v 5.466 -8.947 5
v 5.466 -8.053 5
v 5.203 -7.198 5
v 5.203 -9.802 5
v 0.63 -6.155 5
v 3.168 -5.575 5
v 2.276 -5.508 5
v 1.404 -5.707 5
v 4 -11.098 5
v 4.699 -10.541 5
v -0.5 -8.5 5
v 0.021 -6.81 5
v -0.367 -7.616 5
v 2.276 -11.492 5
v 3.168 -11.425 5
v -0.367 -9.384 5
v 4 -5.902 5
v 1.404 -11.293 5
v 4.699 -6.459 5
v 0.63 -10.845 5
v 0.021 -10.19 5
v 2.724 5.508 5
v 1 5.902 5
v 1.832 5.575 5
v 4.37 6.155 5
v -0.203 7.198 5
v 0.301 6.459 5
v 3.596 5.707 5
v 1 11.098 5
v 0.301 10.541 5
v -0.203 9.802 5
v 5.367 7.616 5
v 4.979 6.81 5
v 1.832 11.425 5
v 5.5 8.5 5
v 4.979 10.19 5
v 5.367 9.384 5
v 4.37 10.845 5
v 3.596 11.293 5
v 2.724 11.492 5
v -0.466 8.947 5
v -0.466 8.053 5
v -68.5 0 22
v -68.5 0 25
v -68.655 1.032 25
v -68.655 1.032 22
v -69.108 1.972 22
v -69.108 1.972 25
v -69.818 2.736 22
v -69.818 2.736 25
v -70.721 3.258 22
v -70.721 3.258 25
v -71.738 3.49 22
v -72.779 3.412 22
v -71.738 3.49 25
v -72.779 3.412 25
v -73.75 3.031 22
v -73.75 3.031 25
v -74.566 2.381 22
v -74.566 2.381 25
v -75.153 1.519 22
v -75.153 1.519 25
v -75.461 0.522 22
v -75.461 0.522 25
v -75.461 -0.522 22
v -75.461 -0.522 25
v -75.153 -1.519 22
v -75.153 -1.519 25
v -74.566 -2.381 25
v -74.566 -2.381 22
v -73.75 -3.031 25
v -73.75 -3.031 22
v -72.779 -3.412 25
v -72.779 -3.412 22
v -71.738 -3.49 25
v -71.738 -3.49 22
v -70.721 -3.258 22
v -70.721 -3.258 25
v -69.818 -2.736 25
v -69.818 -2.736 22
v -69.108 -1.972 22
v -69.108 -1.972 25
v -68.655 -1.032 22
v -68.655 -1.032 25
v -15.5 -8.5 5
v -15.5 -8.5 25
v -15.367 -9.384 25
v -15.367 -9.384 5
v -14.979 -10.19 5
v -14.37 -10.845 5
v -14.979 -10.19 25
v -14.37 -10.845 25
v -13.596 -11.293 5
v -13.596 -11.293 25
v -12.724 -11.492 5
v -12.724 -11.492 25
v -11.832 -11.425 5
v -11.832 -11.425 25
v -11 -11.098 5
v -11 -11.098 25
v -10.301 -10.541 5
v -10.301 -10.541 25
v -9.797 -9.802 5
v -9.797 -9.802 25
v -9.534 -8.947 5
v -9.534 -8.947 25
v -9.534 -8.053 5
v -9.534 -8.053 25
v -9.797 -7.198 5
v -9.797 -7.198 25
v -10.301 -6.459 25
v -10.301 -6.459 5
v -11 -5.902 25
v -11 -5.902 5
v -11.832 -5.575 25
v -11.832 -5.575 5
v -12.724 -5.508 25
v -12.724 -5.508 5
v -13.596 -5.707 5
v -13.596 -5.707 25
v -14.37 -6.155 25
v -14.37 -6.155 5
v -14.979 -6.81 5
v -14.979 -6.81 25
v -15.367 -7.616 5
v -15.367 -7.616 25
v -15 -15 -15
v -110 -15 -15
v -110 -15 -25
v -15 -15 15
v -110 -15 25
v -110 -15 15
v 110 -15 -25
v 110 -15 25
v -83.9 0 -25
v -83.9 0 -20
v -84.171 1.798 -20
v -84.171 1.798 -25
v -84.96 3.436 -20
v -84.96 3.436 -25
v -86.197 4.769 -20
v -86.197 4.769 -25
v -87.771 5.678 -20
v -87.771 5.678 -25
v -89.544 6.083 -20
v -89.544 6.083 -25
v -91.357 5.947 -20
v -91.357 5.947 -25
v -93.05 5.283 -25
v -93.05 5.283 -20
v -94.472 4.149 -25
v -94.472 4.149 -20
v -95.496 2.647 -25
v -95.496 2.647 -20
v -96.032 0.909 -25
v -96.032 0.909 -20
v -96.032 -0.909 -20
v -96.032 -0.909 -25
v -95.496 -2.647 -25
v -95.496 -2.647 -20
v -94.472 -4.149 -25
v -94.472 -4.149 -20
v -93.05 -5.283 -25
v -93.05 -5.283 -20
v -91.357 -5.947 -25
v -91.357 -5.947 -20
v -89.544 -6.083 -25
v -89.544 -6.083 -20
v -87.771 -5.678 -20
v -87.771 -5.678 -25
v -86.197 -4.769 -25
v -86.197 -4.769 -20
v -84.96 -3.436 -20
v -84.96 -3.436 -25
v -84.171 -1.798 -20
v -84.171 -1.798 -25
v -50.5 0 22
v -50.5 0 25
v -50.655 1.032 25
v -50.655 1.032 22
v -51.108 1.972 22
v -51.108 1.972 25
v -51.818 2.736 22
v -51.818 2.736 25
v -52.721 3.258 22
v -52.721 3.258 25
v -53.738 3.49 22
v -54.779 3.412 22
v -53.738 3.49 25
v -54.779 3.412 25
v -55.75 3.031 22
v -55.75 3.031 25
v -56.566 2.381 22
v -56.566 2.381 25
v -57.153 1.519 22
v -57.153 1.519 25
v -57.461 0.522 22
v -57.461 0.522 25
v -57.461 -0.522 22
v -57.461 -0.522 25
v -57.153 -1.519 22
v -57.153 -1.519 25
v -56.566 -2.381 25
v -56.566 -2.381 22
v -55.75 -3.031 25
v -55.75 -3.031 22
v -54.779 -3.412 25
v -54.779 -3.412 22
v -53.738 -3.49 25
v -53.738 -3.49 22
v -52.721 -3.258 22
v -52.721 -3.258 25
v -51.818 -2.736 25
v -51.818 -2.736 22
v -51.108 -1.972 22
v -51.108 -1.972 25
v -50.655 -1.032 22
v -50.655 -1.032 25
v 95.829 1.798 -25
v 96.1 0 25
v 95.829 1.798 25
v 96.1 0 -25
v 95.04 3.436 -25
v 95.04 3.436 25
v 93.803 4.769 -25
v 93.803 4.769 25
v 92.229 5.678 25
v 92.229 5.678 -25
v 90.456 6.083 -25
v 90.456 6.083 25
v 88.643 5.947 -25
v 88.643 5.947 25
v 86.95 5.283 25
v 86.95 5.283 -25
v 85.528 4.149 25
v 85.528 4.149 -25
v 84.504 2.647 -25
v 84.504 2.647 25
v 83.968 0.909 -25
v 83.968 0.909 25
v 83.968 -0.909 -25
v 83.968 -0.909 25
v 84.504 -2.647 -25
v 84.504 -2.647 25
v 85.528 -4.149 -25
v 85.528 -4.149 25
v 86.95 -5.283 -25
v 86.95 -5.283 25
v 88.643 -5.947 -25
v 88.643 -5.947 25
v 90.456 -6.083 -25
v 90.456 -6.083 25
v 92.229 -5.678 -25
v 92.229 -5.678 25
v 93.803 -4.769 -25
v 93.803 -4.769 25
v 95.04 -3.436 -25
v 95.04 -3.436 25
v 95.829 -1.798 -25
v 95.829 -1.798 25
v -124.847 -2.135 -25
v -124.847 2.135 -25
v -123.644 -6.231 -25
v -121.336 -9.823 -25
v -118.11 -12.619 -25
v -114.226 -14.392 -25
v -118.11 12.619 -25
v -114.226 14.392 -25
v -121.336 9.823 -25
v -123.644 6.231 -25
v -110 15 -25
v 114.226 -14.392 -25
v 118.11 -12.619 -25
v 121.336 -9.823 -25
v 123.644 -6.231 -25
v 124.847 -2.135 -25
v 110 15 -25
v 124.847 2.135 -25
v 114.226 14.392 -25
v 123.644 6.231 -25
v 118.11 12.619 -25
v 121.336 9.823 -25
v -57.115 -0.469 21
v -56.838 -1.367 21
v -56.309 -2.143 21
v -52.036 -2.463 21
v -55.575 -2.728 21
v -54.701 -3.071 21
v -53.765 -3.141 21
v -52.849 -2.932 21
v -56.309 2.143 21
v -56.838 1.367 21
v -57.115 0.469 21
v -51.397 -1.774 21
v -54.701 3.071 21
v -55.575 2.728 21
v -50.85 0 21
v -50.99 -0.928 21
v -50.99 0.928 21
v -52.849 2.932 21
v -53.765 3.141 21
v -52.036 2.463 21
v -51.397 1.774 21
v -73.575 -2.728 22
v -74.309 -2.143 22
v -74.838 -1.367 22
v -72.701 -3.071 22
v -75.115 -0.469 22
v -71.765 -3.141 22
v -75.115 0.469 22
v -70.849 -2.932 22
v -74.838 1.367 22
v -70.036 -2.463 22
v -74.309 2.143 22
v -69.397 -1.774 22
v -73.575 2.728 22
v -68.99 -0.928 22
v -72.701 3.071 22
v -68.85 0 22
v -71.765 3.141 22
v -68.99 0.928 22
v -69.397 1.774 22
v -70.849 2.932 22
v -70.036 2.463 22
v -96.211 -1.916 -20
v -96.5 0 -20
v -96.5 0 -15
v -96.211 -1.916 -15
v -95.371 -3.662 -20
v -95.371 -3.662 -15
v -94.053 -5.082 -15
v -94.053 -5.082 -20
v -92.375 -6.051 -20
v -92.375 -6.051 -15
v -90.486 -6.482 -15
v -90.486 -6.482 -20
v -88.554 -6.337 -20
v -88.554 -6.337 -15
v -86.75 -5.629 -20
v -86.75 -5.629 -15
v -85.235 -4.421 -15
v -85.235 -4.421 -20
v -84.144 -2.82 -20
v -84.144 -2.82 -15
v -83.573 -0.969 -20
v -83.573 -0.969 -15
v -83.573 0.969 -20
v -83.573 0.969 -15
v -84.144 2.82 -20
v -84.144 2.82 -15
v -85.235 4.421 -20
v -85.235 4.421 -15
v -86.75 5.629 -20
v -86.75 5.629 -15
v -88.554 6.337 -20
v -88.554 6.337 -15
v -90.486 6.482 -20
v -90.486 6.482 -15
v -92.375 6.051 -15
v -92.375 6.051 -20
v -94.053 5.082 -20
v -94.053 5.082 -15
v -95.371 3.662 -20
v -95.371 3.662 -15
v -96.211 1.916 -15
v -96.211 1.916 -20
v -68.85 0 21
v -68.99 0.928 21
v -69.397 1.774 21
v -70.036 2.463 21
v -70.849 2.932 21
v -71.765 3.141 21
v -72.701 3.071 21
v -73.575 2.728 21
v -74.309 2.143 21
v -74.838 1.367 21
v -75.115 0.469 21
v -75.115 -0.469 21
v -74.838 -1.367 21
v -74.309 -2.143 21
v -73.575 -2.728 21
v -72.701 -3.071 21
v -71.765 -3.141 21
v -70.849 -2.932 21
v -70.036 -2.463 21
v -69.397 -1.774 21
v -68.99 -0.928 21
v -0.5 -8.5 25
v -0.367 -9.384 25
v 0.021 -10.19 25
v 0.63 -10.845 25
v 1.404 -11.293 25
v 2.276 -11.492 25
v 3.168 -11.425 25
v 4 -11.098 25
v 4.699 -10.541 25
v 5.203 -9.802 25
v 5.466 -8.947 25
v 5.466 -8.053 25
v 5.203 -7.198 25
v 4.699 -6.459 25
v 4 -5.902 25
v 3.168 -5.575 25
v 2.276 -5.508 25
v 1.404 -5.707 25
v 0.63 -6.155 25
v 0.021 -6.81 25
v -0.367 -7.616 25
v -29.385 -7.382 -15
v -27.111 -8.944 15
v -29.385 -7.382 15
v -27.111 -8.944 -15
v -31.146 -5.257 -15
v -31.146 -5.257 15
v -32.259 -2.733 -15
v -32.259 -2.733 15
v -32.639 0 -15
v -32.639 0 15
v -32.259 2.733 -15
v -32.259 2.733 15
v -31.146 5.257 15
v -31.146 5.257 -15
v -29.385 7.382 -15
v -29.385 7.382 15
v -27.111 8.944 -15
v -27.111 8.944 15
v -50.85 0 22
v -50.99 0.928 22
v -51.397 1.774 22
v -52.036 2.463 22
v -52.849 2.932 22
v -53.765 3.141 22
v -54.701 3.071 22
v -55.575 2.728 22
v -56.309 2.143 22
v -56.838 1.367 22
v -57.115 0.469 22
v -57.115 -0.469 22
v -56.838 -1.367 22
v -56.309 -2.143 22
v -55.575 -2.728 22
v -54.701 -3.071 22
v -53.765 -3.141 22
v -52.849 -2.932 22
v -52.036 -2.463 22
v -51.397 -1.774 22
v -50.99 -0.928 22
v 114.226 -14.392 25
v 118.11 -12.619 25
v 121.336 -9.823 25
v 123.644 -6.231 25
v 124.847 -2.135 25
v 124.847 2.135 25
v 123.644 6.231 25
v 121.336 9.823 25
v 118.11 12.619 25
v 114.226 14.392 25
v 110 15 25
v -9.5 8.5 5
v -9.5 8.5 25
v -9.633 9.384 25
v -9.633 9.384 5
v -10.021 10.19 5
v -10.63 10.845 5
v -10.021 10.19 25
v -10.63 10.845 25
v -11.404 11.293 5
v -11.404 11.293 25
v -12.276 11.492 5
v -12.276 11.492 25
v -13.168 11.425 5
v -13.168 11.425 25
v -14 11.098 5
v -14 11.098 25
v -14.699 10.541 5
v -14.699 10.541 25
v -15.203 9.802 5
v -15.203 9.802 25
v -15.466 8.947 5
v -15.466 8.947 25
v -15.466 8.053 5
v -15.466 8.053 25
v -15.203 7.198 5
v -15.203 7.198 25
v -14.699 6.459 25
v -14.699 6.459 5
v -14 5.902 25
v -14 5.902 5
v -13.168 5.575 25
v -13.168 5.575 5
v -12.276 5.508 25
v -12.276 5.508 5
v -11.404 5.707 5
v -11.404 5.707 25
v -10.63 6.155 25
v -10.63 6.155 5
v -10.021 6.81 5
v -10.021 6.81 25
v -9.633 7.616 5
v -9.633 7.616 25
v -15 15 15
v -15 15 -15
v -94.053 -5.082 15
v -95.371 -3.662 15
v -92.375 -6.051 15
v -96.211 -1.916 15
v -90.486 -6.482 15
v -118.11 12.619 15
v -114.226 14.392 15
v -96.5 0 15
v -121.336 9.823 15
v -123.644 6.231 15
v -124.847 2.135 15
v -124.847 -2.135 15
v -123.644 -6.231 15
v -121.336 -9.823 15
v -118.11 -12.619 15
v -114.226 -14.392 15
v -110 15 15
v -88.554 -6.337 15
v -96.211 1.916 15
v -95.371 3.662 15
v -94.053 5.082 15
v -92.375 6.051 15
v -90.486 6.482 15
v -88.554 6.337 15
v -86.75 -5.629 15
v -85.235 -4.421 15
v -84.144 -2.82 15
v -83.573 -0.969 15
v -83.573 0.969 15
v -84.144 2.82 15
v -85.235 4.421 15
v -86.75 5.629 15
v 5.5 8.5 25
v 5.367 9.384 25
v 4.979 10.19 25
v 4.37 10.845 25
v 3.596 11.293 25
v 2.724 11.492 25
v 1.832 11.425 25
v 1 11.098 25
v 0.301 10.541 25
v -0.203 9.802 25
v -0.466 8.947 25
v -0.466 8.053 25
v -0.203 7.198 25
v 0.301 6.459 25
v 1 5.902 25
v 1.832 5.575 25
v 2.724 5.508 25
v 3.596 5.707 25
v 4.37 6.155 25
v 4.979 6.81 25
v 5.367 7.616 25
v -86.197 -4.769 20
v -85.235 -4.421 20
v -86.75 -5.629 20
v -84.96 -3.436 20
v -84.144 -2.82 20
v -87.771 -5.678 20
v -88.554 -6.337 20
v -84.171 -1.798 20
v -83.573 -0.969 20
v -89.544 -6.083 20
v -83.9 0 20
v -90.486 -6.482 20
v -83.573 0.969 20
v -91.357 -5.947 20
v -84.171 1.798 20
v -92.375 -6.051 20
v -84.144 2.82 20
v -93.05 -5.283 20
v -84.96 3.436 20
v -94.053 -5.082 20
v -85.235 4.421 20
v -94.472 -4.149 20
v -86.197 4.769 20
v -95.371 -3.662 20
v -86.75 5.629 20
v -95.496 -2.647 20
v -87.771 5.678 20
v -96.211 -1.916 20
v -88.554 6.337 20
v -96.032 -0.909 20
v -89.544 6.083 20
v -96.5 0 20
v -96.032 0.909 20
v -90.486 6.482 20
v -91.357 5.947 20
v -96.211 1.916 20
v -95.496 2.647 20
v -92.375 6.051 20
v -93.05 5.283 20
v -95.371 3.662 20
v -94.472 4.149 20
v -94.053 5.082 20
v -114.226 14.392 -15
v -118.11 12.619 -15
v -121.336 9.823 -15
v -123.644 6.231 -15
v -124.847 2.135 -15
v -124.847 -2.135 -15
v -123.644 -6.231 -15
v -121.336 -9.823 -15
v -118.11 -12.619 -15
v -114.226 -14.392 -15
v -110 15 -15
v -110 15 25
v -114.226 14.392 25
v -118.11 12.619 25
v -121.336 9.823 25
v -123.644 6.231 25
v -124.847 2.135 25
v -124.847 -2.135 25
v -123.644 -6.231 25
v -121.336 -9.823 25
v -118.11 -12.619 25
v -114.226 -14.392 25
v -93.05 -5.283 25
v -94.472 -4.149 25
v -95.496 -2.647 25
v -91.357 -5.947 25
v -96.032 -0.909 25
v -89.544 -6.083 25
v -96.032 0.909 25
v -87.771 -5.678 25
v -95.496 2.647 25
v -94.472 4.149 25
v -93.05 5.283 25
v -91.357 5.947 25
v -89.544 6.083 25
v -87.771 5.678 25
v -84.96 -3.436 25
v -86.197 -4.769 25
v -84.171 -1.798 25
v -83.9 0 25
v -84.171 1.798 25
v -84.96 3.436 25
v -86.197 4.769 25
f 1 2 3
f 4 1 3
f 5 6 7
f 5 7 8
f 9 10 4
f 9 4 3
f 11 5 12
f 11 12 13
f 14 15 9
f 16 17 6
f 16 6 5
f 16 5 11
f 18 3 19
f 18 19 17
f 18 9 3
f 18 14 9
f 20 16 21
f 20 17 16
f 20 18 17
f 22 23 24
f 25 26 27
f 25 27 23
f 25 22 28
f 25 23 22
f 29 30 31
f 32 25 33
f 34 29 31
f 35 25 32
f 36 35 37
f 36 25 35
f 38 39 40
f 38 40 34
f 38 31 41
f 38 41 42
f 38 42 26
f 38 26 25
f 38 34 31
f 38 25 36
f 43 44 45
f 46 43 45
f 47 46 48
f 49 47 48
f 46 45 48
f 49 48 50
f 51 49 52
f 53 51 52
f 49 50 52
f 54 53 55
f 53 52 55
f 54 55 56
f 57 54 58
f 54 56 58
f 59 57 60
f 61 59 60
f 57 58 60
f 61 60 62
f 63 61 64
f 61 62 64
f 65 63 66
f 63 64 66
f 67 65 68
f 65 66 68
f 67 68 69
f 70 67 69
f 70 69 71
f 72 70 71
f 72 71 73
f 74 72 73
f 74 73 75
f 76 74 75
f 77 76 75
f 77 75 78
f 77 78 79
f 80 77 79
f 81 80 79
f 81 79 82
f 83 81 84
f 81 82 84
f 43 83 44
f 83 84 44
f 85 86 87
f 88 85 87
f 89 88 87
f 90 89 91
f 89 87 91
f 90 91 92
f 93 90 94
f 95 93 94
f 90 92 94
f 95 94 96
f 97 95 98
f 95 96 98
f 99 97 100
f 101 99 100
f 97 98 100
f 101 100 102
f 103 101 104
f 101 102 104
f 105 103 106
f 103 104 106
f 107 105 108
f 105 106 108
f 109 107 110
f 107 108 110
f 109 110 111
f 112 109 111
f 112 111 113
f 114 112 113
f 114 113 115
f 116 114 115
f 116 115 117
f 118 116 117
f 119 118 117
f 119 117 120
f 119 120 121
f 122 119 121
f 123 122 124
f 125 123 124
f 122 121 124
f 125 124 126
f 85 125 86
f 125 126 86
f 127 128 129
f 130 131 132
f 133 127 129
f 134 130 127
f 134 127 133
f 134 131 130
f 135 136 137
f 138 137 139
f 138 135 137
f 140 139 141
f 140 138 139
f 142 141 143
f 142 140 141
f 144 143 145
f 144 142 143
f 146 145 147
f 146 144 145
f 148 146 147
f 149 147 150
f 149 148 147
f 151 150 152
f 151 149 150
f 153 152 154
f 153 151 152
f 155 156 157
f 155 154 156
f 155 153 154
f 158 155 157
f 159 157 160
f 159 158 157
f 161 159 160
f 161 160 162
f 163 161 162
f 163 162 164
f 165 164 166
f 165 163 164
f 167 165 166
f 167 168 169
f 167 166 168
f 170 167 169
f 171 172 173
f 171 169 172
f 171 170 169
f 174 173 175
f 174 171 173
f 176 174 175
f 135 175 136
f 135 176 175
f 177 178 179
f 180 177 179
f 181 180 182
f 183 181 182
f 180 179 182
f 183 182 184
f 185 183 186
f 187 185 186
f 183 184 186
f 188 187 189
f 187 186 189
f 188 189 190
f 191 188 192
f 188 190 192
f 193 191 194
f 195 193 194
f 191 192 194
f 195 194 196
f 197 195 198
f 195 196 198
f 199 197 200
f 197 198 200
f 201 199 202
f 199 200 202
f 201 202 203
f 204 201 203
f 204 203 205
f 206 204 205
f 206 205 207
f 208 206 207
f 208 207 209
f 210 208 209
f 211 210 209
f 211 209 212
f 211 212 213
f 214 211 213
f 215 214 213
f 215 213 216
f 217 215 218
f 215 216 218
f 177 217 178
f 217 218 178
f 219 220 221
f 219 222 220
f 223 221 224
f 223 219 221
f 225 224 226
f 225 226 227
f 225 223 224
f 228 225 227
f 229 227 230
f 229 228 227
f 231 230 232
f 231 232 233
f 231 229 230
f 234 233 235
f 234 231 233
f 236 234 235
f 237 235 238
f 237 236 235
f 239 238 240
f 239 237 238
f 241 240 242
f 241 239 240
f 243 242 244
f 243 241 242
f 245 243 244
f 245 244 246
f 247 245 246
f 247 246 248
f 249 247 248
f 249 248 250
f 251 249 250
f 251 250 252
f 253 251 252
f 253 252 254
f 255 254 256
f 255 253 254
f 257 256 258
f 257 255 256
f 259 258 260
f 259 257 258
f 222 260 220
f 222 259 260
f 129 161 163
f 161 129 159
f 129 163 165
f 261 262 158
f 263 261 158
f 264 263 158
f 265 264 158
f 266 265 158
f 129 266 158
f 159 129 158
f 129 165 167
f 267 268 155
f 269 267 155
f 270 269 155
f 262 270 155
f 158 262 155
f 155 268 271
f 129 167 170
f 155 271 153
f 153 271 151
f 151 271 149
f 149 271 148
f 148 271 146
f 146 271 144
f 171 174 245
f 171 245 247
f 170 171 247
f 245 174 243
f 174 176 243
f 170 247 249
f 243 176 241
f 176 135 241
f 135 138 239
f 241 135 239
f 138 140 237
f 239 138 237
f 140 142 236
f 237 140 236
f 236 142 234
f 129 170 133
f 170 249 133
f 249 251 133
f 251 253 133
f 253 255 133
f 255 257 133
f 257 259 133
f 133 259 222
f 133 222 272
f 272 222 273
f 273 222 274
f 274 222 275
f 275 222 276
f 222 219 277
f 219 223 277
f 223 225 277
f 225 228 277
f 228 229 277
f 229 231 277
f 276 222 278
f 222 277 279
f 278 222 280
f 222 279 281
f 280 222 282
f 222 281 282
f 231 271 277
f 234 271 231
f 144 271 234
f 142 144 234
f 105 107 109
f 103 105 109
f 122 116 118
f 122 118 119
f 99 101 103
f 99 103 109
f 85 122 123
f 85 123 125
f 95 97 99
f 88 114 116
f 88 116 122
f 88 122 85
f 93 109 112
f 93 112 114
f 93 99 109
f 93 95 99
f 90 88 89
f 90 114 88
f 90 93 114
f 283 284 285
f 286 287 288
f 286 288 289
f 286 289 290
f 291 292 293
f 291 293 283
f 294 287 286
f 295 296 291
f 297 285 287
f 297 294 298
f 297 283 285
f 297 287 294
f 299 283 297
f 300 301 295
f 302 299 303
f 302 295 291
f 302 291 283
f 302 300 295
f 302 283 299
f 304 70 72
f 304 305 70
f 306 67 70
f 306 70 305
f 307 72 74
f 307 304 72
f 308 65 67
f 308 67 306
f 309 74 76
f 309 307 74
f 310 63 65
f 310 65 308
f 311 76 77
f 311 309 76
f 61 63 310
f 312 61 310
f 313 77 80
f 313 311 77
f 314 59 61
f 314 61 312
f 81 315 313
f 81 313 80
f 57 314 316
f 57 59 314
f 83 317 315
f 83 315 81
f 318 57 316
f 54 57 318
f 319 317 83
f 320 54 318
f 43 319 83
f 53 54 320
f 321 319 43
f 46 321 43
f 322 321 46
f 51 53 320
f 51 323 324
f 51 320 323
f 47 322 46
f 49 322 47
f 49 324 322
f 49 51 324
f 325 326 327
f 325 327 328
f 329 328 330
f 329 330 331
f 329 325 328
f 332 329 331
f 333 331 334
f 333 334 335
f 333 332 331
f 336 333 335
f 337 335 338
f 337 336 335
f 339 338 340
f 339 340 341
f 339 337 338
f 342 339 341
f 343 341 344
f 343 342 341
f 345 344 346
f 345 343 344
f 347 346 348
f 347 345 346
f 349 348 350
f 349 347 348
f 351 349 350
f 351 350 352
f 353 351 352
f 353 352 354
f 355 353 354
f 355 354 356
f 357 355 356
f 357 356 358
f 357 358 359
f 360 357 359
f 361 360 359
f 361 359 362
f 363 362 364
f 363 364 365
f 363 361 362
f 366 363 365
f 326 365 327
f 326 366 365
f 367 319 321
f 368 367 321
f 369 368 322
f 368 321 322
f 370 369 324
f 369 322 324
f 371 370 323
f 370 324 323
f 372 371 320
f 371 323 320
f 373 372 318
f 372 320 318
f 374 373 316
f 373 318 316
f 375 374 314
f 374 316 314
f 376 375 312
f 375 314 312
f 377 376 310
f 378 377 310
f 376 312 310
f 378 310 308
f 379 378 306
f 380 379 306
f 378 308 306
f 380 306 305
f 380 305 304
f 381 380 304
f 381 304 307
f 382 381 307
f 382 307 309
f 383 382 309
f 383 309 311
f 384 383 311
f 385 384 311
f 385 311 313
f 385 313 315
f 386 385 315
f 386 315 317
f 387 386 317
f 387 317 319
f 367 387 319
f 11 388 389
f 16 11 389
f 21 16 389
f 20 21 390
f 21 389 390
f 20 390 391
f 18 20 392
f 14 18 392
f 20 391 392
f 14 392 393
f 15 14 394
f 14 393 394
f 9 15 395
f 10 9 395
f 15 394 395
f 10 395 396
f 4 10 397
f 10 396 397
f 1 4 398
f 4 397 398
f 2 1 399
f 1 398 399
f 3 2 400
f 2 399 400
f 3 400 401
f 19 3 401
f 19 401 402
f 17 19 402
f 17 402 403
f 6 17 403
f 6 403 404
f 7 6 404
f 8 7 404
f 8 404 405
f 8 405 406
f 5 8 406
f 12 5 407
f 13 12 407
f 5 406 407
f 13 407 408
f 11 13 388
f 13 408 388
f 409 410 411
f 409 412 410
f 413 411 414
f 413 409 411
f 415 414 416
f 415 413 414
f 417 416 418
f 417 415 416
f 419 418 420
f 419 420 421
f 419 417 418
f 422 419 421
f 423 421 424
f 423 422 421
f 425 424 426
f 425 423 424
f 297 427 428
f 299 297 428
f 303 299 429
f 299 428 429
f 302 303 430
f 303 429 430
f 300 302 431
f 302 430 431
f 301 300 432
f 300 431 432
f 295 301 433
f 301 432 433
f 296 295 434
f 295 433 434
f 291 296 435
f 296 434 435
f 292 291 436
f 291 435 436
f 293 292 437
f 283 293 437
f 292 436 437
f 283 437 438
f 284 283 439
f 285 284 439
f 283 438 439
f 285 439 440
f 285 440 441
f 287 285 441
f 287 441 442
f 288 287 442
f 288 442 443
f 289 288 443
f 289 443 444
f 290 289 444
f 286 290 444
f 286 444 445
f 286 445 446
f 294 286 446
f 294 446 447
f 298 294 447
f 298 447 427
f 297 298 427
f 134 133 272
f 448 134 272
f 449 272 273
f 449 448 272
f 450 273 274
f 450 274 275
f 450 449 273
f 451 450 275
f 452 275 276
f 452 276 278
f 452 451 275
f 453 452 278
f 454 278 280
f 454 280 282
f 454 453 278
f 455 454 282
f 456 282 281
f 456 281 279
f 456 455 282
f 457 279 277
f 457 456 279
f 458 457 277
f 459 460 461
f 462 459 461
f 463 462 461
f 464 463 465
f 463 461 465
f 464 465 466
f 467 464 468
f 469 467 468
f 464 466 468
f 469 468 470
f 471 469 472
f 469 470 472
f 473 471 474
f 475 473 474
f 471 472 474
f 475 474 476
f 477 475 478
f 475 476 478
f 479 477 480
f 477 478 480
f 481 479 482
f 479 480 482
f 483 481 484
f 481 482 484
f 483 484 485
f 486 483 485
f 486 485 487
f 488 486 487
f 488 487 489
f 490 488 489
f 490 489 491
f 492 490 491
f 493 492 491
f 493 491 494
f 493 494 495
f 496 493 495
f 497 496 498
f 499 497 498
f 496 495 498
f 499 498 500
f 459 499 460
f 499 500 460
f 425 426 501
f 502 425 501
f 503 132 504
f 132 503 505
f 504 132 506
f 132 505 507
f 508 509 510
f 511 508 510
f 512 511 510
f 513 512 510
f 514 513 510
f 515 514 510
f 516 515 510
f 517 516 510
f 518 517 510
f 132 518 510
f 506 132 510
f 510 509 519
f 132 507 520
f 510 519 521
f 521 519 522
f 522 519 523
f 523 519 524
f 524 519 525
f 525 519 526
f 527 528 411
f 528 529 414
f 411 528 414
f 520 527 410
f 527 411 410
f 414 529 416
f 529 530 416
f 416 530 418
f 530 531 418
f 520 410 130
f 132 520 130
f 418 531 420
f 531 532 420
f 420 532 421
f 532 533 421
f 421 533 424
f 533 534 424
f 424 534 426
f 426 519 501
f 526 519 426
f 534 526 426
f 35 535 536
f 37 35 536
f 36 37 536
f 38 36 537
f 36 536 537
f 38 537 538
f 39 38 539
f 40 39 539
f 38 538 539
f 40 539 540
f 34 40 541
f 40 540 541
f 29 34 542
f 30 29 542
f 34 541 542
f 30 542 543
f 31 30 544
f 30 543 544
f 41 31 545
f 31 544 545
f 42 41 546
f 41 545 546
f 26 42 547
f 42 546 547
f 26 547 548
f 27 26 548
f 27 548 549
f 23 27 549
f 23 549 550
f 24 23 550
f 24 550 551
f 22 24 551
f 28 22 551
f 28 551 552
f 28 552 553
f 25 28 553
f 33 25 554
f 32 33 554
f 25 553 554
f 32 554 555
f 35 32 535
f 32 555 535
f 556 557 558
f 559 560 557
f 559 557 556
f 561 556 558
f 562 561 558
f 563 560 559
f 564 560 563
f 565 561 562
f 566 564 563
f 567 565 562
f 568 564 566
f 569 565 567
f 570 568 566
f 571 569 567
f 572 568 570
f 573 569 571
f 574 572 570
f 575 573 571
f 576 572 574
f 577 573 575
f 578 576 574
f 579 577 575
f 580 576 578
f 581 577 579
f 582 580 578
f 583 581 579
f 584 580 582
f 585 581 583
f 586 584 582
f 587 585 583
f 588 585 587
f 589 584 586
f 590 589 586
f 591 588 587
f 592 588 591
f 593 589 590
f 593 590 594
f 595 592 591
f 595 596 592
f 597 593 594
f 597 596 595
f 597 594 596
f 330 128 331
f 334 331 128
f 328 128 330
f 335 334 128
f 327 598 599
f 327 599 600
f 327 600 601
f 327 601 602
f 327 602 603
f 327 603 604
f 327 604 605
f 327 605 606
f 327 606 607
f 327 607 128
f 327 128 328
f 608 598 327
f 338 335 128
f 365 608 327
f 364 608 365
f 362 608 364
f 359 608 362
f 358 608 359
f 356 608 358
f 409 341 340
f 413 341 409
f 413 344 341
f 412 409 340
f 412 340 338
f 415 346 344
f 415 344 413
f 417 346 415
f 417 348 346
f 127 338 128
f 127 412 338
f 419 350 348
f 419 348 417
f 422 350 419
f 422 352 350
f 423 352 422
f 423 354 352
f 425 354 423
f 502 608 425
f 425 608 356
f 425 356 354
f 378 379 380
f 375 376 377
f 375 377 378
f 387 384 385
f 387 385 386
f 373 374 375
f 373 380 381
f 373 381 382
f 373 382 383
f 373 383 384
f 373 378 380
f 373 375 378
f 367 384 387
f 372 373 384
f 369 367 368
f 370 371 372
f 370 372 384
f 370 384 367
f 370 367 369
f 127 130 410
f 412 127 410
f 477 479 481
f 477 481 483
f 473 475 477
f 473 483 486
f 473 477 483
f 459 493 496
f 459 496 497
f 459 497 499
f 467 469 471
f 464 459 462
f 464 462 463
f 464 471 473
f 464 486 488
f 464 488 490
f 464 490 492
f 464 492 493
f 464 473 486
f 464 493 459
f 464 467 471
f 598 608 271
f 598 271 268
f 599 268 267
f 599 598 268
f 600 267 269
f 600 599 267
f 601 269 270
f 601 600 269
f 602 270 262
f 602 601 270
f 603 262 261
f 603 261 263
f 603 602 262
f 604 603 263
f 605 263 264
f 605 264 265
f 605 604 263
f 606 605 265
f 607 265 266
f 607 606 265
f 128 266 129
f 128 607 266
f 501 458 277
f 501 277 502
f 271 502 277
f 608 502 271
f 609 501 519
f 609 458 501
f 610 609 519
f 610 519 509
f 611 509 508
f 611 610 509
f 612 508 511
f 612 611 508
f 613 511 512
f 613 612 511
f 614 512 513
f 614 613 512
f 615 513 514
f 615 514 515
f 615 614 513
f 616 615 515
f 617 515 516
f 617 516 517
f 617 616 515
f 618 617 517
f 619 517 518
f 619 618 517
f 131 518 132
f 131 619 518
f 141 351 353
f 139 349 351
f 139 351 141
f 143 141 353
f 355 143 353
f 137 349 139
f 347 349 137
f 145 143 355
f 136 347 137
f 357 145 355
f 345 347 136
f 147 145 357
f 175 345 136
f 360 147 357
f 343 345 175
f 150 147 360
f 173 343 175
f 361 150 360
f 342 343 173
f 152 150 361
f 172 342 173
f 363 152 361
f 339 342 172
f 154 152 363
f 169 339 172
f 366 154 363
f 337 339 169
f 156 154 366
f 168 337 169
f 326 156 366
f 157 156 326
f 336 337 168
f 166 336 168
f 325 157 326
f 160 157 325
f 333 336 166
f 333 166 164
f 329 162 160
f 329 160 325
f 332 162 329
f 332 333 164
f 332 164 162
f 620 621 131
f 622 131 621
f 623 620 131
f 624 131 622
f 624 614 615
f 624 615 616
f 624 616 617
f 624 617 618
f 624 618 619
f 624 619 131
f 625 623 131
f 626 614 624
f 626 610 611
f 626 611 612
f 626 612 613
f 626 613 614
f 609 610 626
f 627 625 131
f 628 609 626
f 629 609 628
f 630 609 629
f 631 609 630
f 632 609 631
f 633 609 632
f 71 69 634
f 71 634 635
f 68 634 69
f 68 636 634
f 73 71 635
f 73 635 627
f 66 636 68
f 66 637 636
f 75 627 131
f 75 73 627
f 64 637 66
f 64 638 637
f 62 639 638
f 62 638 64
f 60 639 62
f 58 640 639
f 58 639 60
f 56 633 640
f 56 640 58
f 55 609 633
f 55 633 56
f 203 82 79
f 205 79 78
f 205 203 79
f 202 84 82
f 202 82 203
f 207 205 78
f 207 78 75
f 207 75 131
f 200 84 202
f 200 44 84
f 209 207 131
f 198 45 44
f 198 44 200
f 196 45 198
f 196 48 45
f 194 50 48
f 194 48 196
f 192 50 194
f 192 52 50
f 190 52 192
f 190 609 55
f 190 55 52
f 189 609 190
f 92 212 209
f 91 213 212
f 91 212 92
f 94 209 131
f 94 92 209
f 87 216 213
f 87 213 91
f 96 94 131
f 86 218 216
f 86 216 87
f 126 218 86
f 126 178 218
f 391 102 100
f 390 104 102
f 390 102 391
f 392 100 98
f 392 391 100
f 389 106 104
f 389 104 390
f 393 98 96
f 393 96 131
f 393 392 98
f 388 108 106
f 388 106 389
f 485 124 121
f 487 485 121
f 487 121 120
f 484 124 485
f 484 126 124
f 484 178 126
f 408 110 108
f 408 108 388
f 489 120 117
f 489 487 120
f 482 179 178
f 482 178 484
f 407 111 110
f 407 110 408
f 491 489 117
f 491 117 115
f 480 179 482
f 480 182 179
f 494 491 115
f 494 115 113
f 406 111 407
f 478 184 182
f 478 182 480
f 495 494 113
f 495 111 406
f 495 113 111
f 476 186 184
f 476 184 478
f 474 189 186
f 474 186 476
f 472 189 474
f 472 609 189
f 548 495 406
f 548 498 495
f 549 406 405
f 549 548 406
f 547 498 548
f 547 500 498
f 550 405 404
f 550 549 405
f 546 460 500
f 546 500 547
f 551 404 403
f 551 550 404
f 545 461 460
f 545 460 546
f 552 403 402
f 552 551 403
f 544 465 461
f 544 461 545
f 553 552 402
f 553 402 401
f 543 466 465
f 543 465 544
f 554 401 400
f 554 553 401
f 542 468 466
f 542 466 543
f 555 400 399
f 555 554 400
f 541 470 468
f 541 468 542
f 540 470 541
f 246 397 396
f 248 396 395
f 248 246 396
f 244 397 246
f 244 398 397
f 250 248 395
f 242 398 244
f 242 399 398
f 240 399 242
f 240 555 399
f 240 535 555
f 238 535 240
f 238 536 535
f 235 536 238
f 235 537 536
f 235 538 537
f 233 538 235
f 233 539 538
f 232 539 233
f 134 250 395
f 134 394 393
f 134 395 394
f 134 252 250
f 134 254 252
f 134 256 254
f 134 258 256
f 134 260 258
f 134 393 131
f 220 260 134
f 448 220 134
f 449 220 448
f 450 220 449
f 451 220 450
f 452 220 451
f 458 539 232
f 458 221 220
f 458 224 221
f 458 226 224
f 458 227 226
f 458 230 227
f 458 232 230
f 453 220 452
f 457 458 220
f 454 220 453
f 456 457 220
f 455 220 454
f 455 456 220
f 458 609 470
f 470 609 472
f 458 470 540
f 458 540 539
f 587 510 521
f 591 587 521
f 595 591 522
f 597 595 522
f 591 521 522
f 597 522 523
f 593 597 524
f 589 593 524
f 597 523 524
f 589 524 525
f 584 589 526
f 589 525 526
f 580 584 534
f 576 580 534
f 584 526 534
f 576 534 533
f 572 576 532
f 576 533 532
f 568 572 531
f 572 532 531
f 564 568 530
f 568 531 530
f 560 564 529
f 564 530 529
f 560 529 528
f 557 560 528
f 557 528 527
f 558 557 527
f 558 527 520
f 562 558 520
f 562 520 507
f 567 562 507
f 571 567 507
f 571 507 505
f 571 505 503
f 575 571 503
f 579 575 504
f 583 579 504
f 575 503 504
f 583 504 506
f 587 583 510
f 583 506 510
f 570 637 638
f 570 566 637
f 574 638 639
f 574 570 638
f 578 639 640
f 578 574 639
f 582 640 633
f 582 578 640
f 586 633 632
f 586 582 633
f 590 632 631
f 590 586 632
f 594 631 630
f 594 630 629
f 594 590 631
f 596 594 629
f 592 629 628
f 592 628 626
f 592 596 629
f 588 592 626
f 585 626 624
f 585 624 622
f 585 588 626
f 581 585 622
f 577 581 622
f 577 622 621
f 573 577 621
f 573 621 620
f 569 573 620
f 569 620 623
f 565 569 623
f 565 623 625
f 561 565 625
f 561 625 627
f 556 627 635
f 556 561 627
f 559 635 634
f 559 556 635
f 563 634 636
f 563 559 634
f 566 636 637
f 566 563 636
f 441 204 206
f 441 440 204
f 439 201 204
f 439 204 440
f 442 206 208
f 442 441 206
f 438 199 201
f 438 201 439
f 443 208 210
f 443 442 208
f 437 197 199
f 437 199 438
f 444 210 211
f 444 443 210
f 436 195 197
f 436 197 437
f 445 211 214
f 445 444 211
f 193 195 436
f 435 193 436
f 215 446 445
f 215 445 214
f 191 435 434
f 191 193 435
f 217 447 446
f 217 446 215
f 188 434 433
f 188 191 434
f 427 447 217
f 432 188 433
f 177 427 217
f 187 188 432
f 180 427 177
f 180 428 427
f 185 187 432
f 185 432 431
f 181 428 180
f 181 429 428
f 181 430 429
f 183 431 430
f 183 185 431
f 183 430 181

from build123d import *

# Parameters (mm, degrees)
SKETCH1_R           = 6.1
BOSS_EXTRUDE1_DEPTH = 25
SKETCH2_W           = 160
SKETCH2_H           = 30
CUT_EXTRUDE1_DEPTH  = 50
CUT_EXTRUDE5_DEPTH  = 30
CUT_EXTRUDE7_DEPTH  = 30
FILLET3_R           = 10
SKETCH8_R           = 3
CUT_EXTRUDE8_DEPTH  = 20
SKETCH9_R           = 3.15
CUT_EXTRUDE9_DEPTH  = 4
SKETCH10_R          = 3.5
CUT_EXTRUDE10_DEPTH = 3
SKETCH11_R          = 6.5
CUT_EXTRUDE11_DEPTH = 5
CUT_EXTRUDE12_START = -5
SKETCH12_R          = 6.5
CUT_EXTRUDE12_DEPTH = 5


with BuildPart() as part:
    # Sketch1 → Boss-Extrude1 (new, symmetric)
    with BuildSketch(Plane.XY):
        with BuildLine():
            Line((-110, -15), (110, -15))
            ThreePointArc((110, -15), (125, 0), (110, 15))
            Line((110, 15), (-110, 15))
            ThreePointArc((-110, 15), (-125, 0), (-110, -15))
        make_face()
        with Locations((-90, 0)):
            Circle(SKETCH1_R, mode=Mode.SUBTRACT)
        with Locations((90, 0)):
            Circle(SKETCH1_R, mode=Mode.SUBTRACT)
    extrude(amount=BOSS_EXTRUDE1_DEPTH, both=True)

    # Sketch2 → Cut-Extrude1 (cut)
    with BuildSketch(Plane(origin=(0, 15, 0), x_dir=(1, 0, 0), z_dir=(0, 1, 0))):
        with Locations((-125, 0)):
            Rectangle(SKETCH2_W, SKETCH2_H)
    extrude(amount=-CUT_EXTRUDE1_DEPTH, mode=Mode.SUBTRACT)

    # Sketch4 → Cut-Extrude5 (cut)
    with BuildSketch(Plane.XY.offset(15)):
        Polygon((-45, 15), (-45, 0), (-15, 15), align=None)
    extrude(amount=-CUT_EXTRUDE5_DEPTH, mode=Mode.SUBTRACT)

    # Sketch7 → Cut-Extrude7 (cut)
    with BuildSketch(Plane(origin=(0, 0, 15), x_dir=(-1, 0, 0), z_dir=(0, 0, -1))):
        Polygon((45, 0), (45, -15), (15, -15), align=None)
    extrude(amount=CUT_EXTRUDE7_DEPTH, mode=Mode.SUBTRACT)

    # Fillet3
    fillet3_edges = [part.edges().sort_by_distance(p)[0] for p in [
        (-45, 0, 0),
    ]]
    fillet(fillet3_edges, radius=FILLET3_R)

    # Sketch8 → Cut-Extrude8 (cut)
    with BuildSketch(Plane.XY.offset(25)):
        with Locations((-12.5, 8.5)):
            Circle(SKETCH8_R)
        with Locations((2.5, 8.5)):
            Circle(SKETCH8_R)
        with Locations(Location((2.5, -8.5, 0), (0, 0, 180))):
            Circle(SKETCH8_R)
        with Locations(Location((-12.5, -8.5, 0), (0, 0, 180))):
            Circle(SKETCH8_R)
    extrude(amount=-CUT_EXTRUDE8_DEPTH, mode=Mode.SUBTRACT)

    # Sketch9 → Cut-Extrude9 (cut)
    with BuildSketch(Plane.XY.offset(25)):
        with Locations((-72, 0)):
            Circle(SKETCH9_R)
        with Locations((-54, 0)):
            Circle(SKETCH9_R)
    extrude(amount=-CUT_EXTRUDE9_DEPTH, mode=Mode.SUBTRACT)

    # Sketch10 → Cut-Extrude10 (cut)
    with BuildSketch(Plane.XY.offset(25)):
        with Locations((-72, 0)):
            Circle(SKETCH10_R)
        with Locations((-54, 0)):
            Circle(SKETCH10_R)
    extrude(amount=-CUT_EXTRUDE10_DEPTH, mode=Mode.SUBTRACT)

    # Sketch11 → Cut-Extrude11 (cut)
    with BuildSketch(Plane(origin=(0, 0, 15), x_dir=(-1, 0, 0), z_dir=(0, 0, -1))):
        with Locations((90, 0)):
            Circle(SKETCH11_R)
    extrude(amount=-CUT_EXTRUDE11_DEPTH, mode=Mode.SUBTRACT)

    # Sketch12 → Cut-Extrude12 (cut)
    with BuildSketch(Plane.XY.offset(-15).offset(CUT_EXTRUDE12_START)):
        with Locations(Location((-90, 0, 0), (0, 0, 180))):
            Circle(SKETCH12_R)
    extrude(amount=CUT_EXTRUDE12_DEPTH, mode=Mode.SUBTRACT)


solid = part.part
